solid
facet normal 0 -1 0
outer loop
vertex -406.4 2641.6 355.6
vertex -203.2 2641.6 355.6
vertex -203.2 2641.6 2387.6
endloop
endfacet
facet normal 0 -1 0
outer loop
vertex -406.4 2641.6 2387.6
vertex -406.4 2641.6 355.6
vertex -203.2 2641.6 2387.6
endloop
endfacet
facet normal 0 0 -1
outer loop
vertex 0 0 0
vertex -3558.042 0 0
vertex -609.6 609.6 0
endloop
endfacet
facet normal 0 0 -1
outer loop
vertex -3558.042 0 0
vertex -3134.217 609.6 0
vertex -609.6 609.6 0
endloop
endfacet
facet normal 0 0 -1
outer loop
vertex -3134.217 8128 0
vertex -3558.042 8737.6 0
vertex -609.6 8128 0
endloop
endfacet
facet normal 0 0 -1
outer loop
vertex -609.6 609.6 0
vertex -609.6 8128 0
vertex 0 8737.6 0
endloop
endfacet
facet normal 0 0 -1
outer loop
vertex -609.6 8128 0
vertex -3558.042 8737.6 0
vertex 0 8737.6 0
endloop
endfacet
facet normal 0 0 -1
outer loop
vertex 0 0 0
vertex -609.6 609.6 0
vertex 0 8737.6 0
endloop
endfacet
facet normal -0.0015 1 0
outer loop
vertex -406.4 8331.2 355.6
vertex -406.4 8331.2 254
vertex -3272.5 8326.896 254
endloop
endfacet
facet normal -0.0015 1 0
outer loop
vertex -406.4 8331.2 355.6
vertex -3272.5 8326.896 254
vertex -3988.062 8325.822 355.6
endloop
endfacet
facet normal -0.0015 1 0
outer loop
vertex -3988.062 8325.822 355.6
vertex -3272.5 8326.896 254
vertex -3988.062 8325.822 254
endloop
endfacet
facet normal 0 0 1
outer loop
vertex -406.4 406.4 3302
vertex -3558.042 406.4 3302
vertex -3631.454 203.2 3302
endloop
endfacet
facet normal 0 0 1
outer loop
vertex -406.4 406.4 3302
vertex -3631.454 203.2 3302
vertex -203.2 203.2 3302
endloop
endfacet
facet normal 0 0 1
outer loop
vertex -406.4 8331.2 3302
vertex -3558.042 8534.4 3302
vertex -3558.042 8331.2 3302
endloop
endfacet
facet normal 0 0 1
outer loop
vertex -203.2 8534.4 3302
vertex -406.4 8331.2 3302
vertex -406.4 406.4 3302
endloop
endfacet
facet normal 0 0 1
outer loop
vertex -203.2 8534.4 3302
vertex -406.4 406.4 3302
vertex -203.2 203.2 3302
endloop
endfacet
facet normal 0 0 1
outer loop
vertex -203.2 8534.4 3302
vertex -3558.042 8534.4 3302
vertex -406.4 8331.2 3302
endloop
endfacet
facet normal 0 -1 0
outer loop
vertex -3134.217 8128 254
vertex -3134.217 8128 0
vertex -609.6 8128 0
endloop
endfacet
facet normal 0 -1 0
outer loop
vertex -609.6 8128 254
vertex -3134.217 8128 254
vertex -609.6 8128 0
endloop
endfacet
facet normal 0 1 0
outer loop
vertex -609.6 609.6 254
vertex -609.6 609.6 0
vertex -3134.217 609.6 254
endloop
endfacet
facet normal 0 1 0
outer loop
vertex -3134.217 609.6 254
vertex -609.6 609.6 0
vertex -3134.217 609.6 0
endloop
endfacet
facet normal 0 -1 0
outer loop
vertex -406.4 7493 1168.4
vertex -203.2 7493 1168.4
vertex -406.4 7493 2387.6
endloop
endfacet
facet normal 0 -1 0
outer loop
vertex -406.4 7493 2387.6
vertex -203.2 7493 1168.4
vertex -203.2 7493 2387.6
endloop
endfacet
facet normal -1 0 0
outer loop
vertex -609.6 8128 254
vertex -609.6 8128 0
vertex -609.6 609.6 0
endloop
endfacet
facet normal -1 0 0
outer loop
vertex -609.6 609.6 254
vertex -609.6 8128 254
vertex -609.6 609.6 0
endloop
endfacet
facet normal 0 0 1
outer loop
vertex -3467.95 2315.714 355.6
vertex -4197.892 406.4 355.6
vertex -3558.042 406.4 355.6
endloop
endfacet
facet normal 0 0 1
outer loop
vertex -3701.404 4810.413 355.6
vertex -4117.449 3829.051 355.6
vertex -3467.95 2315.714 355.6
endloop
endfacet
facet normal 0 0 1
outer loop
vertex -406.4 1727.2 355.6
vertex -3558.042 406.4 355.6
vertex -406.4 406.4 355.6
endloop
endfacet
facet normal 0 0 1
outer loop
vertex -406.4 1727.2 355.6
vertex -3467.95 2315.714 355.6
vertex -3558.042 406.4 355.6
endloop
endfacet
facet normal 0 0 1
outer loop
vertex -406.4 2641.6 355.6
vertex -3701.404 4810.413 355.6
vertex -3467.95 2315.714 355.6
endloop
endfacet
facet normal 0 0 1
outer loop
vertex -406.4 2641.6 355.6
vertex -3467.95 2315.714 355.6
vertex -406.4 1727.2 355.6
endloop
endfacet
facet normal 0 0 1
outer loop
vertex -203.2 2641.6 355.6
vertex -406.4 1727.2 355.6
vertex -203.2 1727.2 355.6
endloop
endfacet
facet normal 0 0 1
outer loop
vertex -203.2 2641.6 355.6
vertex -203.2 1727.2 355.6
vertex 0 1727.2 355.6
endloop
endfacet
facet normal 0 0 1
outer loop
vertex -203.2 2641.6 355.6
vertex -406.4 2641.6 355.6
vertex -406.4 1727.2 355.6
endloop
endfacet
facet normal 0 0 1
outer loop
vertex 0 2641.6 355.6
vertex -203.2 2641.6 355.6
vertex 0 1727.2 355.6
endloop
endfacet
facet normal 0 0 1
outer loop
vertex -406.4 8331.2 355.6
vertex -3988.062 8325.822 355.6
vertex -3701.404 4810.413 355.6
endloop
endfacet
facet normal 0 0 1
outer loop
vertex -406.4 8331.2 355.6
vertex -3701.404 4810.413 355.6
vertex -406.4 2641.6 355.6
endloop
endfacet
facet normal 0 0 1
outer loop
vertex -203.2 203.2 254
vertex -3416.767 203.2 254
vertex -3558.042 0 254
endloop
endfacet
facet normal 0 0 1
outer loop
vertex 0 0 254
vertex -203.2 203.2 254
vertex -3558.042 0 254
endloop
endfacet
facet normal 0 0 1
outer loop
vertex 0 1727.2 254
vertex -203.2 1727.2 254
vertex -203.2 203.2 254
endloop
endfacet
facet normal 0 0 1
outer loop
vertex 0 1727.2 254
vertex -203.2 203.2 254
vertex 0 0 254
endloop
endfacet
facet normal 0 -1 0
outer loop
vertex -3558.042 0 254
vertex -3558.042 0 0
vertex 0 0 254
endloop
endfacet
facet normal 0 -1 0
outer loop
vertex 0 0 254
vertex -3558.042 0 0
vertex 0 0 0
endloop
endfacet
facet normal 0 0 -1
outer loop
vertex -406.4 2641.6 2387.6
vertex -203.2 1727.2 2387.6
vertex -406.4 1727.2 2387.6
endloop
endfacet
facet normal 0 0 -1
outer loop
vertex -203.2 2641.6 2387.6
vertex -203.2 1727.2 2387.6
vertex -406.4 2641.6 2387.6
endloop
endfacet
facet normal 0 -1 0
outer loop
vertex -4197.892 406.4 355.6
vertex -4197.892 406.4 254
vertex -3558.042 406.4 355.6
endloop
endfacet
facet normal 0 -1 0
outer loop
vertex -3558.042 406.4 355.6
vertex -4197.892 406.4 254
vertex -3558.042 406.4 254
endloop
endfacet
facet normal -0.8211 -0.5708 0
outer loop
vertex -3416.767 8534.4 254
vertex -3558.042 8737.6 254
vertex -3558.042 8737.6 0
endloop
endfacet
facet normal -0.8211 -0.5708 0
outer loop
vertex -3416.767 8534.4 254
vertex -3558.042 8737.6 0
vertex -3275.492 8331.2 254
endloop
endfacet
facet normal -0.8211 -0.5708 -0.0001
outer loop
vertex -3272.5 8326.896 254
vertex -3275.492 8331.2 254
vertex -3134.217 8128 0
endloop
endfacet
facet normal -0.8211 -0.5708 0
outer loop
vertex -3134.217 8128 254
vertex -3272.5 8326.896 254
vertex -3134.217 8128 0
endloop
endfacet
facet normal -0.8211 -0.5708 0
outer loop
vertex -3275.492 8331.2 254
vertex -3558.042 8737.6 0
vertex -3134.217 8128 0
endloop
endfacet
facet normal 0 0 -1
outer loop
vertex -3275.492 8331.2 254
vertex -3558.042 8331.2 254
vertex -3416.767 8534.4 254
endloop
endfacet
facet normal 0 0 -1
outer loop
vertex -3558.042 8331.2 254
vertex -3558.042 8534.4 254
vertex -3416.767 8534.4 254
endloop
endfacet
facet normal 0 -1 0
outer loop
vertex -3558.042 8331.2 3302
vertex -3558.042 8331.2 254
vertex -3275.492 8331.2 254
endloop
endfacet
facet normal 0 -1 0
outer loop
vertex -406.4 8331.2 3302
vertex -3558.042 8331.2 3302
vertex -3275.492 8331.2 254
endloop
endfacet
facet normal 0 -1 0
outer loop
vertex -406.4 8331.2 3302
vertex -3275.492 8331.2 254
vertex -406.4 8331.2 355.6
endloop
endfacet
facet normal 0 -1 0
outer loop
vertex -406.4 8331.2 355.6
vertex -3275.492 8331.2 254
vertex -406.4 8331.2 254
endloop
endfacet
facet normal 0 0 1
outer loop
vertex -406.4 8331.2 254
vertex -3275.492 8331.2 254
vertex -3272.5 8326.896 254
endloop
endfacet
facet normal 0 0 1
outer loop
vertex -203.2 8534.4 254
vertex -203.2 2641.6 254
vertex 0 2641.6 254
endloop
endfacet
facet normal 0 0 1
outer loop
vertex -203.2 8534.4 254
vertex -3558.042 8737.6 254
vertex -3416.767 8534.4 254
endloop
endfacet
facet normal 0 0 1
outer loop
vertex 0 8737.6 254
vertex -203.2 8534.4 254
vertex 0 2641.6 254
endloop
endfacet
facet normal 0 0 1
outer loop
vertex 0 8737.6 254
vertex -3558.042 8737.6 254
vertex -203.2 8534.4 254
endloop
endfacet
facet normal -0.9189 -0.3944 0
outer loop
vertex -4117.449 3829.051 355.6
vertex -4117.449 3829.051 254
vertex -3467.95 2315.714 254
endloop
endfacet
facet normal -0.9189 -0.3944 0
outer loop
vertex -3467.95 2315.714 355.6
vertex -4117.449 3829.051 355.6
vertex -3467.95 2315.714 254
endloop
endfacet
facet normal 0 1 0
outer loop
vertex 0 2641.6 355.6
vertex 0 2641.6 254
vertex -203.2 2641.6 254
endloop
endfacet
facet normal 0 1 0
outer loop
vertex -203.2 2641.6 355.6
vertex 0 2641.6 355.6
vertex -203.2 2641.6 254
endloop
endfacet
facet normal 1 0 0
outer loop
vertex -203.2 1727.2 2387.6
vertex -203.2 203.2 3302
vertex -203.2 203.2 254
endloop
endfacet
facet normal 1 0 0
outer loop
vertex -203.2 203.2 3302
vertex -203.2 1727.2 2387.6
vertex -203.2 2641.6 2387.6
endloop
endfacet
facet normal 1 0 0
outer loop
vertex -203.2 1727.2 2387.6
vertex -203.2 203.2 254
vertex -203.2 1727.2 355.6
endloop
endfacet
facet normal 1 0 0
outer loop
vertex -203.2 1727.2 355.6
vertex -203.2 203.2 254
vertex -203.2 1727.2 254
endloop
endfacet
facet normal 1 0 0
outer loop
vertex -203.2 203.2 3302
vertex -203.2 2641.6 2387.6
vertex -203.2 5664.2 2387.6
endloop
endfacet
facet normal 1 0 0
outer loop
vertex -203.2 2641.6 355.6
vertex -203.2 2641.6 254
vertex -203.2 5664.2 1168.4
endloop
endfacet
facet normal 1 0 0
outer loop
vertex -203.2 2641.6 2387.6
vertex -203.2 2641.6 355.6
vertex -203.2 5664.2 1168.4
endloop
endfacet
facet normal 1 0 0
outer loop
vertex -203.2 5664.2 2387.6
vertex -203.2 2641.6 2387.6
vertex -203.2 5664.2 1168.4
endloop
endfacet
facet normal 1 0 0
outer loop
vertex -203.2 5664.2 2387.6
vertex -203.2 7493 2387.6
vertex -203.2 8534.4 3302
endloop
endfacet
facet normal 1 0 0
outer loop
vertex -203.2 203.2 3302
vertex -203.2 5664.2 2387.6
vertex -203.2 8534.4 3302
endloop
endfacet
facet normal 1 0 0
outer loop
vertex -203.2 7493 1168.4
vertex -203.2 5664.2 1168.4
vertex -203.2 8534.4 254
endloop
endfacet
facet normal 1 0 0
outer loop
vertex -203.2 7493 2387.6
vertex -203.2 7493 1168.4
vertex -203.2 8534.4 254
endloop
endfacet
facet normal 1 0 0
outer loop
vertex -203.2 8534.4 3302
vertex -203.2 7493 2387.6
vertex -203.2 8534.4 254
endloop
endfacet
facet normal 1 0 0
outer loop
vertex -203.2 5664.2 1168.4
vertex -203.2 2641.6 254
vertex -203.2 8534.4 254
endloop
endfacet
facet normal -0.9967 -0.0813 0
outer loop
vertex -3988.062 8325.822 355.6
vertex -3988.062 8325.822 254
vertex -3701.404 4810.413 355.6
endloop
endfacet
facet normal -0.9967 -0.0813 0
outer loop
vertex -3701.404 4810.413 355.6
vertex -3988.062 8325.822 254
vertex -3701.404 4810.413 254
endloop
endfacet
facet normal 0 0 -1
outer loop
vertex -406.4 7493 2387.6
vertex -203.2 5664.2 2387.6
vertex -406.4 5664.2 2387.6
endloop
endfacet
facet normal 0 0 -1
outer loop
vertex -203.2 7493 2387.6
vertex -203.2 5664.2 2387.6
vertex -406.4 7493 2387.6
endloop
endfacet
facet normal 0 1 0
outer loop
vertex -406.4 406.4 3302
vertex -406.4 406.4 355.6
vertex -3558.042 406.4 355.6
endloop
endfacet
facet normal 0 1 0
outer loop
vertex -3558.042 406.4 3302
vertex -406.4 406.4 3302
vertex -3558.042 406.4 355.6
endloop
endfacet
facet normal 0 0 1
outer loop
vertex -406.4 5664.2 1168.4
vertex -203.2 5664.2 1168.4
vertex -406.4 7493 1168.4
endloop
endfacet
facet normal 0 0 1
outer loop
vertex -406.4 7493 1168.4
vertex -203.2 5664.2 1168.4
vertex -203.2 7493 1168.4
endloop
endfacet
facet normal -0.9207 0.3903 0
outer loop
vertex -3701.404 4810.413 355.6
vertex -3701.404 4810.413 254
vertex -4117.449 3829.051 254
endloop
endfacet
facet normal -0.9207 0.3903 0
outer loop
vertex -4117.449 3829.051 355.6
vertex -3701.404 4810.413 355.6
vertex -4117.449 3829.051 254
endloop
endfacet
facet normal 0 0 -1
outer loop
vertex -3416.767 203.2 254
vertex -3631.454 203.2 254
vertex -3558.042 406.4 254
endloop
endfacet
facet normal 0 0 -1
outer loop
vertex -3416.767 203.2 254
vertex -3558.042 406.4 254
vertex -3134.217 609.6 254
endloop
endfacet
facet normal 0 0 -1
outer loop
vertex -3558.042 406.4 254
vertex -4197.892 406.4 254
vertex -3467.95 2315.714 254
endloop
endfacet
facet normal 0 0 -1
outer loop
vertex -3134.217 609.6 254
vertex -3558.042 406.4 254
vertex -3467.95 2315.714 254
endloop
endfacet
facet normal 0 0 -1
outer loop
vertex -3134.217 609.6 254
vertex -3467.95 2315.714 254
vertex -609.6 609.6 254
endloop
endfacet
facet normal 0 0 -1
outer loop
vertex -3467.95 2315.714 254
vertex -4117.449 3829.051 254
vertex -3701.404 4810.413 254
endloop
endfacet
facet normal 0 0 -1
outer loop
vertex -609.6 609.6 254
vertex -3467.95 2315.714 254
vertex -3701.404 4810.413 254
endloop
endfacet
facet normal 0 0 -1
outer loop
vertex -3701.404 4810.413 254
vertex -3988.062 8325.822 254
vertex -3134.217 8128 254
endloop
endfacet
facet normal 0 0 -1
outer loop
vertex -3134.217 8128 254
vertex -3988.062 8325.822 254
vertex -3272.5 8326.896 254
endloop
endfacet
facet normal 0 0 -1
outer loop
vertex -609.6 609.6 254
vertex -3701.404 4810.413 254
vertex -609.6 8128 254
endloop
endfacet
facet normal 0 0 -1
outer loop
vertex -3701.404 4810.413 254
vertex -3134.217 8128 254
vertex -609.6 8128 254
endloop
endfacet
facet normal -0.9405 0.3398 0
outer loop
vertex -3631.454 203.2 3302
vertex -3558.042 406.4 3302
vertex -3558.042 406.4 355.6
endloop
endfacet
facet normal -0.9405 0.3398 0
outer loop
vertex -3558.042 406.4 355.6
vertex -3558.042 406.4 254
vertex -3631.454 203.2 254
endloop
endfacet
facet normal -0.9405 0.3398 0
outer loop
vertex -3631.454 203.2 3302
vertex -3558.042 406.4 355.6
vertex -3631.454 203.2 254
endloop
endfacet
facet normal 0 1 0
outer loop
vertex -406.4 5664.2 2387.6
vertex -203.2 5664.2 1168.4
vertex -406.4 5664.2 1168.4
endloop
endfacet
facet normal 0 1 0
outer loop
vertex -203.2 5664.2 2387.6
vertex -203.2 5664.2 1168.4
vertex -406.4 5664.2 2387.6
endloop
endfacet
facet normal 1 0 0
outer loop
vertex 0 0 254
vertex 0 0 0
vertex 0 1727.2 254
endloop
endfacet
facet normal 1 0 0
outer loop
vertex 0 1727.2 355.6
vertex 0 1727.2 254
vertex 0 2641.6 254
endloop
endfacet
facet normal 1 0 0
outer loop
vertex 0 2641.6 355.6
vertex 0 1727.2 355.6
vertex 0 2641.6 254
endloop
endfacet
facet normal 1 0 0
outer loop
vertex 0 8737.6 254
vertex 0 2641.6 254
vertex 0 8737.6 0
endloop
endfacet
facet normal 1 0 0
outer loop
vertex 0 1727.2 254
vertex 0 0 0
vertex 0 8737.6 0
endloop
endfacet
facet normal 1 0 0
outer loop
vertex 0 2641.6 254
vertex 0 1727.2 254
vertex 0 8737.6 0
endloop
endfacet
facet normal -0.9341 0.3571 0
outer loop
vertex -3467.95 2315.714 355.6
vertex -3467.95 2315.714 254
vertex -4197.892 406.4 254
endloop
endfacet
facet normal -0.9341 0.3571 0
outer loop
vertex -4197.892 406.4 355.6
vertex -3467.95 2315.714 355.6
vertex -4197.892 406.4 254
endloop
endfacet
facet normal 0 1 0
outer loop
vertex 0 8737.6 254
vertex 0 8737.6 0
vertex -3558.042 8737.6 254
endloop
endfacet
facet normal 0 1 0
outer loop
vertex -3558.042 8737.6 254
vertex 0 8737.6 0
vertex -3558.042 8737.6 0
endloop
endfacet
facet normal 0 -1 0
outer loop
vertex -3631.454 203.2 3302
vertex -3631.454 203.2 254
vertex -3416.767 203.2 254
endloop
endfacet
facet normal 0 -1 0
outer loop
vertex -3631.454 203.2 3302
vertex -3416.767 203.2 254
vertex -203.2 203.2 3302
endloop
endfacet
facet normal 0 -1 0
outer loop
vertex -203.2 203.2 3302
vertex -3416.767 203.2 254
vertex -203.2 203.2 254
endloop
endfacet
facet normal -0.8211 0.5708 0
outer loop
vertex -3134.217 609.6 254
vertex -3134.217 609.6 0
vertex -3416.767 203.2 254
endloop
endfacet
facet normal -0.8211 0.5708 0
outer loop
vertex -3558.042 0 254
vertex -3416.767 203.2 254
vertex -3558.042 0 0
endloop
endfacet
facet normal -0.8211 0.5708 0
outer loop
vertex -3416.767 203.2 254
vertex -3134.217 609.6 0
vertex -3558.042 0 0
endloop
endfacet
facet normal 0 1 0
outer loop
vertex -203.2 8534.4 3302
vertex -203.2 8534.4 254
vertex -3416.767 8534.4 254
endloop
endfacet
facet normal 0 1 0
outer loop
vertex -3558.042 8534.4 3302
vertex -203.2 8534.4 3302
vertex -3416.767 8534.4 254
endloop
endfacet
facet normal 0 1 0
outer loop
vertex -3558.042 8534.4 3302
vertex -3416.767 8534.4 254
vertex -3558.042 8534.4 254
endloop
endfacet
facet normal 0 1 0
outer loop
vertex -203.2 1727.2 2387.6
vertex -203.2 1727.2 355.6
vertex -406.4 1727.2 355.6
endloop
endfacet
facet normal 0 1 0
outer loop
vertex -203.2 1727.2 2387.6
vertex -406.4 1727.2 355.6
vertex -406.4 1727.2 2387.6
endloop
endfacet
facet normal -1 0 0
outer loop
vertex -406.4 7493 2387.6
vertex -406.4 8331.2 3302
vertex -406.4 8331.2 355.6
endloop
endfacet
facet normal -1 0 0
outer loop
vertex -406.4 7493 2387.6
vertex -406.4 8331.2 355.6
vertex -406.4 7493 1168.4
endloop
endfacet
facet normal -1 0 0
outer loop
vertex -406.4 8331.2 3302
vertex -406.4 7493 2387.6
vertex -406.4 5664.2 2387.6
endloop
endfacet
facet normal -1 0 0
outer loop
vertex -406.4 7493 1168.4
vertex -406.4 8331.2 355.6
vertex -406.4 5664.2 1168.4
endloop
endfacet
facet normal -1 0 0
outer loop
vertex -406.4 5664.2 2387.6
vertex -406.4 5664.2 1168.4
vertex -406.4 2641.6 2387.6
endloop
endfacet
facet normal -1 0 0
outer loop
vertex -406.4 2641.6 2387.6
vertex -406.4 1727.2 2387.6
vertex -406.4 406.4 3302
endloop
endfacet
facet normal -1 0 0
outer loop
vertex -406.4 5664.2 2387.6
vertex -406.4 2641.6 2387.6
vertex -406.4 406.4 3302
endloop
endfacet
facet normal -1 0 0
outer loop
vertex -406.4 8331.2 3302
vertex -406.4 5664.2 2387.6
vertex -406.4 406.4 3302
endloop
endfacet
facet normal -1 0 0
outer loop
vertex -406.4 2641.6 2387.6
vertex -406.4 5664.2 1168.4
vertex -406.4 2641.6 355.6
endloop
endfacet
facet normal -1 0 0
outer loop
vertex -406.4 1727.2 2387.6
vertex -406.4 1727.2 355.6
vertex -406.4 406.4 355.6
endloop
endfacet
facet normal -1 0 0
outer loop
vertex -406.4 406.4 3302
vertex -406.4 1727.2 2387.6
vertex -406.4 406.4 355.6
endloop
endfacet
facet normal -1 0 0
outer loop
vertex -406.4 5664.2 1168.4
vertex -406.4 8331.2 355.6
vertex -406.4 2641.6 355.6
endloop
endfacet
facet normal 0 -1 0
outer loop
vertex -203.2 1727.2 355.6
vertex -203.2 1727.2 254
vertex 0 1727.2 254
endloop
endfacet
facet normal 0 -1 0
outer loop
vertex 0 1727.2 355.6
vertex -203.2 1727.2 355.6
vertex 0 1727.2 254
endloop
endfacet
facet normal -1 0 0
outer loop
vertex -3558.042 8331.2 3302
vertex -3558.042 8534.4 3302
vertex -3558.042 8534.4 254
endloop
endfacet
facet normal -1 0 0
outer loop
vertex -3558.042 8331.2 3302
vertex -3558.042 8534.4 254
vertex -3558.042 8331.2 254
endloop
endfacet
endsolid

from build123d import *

# Parameters (mm, degrees)
F1_DEPTH = 254
F3_DEPTH = 3048
F4_W     = 914.4
F4_H     = 2133.6
F4_W_2   = 1828.8
F4_H_2   = 1219.2
F5_DEPTH = 203.2
F7_DEPTH = 101.6


with BuildPart() as f1:
    # F0 (on Top) → F1 (new body)
    with BuildSketch(Plane.XY):
        Polygon((-3558.042188, 0), (0, 0), (0, 8737.6), (-3558.042188, 8737.6), (-3134.217299, 8128), (-609.6, 8128), (-609.6, 609.6), (-3134.217299, 609.6), align=None)
    extrude(amount=F1_DEPTH)

    # F2 (on face) → F3 (join)
    with BuildSketch(Plane.XY.offset(254)):
        Polygon((-3558.042188, 406.4), (-3631.453591, 203.2), (-203.2, 203.2), (-203.2, 8534.4), (-3558.042188, 8534.4), (-3558.042188, 8331.2), (-406.4, 8331.2), (-406.4, 406.4), align=None)
    extrude(amount=F3_DEPTH)

    # F4 (on face) → F5 (cut)
    with BuildSketch(Plane.YZ.offset(-203.2)):
        with Locations((2184.4, 1320.8)):
            Rectangle(F4_W, F4_H)
        with Locations((6578.6, 1778)):
            Rectangle(F4_W_2, F4_H_2)
    extrude(amount=-F5_DEPTH, mode=Mode.SUBTRACT)

    # F6 (on face) → F7 (join)
    with BuildSketch(Plane.XY.offset(254)):
        Polygon((-4197.892189, 406.4), (-406.4, 406.4), (-406.4, 1727.2), (0, 1727.2), (0, 2641.6), (-406.4, 2641.6), (-406.4, 8331.2), (-3988.061666, 8325.821877), (-3701.404333, 4810.412884), (-4117.448807, 3829.051256), (-3467.950344, 2315.713644), align=None)
    extrude(amount=F7_DEPTH)


solid = f1.part
